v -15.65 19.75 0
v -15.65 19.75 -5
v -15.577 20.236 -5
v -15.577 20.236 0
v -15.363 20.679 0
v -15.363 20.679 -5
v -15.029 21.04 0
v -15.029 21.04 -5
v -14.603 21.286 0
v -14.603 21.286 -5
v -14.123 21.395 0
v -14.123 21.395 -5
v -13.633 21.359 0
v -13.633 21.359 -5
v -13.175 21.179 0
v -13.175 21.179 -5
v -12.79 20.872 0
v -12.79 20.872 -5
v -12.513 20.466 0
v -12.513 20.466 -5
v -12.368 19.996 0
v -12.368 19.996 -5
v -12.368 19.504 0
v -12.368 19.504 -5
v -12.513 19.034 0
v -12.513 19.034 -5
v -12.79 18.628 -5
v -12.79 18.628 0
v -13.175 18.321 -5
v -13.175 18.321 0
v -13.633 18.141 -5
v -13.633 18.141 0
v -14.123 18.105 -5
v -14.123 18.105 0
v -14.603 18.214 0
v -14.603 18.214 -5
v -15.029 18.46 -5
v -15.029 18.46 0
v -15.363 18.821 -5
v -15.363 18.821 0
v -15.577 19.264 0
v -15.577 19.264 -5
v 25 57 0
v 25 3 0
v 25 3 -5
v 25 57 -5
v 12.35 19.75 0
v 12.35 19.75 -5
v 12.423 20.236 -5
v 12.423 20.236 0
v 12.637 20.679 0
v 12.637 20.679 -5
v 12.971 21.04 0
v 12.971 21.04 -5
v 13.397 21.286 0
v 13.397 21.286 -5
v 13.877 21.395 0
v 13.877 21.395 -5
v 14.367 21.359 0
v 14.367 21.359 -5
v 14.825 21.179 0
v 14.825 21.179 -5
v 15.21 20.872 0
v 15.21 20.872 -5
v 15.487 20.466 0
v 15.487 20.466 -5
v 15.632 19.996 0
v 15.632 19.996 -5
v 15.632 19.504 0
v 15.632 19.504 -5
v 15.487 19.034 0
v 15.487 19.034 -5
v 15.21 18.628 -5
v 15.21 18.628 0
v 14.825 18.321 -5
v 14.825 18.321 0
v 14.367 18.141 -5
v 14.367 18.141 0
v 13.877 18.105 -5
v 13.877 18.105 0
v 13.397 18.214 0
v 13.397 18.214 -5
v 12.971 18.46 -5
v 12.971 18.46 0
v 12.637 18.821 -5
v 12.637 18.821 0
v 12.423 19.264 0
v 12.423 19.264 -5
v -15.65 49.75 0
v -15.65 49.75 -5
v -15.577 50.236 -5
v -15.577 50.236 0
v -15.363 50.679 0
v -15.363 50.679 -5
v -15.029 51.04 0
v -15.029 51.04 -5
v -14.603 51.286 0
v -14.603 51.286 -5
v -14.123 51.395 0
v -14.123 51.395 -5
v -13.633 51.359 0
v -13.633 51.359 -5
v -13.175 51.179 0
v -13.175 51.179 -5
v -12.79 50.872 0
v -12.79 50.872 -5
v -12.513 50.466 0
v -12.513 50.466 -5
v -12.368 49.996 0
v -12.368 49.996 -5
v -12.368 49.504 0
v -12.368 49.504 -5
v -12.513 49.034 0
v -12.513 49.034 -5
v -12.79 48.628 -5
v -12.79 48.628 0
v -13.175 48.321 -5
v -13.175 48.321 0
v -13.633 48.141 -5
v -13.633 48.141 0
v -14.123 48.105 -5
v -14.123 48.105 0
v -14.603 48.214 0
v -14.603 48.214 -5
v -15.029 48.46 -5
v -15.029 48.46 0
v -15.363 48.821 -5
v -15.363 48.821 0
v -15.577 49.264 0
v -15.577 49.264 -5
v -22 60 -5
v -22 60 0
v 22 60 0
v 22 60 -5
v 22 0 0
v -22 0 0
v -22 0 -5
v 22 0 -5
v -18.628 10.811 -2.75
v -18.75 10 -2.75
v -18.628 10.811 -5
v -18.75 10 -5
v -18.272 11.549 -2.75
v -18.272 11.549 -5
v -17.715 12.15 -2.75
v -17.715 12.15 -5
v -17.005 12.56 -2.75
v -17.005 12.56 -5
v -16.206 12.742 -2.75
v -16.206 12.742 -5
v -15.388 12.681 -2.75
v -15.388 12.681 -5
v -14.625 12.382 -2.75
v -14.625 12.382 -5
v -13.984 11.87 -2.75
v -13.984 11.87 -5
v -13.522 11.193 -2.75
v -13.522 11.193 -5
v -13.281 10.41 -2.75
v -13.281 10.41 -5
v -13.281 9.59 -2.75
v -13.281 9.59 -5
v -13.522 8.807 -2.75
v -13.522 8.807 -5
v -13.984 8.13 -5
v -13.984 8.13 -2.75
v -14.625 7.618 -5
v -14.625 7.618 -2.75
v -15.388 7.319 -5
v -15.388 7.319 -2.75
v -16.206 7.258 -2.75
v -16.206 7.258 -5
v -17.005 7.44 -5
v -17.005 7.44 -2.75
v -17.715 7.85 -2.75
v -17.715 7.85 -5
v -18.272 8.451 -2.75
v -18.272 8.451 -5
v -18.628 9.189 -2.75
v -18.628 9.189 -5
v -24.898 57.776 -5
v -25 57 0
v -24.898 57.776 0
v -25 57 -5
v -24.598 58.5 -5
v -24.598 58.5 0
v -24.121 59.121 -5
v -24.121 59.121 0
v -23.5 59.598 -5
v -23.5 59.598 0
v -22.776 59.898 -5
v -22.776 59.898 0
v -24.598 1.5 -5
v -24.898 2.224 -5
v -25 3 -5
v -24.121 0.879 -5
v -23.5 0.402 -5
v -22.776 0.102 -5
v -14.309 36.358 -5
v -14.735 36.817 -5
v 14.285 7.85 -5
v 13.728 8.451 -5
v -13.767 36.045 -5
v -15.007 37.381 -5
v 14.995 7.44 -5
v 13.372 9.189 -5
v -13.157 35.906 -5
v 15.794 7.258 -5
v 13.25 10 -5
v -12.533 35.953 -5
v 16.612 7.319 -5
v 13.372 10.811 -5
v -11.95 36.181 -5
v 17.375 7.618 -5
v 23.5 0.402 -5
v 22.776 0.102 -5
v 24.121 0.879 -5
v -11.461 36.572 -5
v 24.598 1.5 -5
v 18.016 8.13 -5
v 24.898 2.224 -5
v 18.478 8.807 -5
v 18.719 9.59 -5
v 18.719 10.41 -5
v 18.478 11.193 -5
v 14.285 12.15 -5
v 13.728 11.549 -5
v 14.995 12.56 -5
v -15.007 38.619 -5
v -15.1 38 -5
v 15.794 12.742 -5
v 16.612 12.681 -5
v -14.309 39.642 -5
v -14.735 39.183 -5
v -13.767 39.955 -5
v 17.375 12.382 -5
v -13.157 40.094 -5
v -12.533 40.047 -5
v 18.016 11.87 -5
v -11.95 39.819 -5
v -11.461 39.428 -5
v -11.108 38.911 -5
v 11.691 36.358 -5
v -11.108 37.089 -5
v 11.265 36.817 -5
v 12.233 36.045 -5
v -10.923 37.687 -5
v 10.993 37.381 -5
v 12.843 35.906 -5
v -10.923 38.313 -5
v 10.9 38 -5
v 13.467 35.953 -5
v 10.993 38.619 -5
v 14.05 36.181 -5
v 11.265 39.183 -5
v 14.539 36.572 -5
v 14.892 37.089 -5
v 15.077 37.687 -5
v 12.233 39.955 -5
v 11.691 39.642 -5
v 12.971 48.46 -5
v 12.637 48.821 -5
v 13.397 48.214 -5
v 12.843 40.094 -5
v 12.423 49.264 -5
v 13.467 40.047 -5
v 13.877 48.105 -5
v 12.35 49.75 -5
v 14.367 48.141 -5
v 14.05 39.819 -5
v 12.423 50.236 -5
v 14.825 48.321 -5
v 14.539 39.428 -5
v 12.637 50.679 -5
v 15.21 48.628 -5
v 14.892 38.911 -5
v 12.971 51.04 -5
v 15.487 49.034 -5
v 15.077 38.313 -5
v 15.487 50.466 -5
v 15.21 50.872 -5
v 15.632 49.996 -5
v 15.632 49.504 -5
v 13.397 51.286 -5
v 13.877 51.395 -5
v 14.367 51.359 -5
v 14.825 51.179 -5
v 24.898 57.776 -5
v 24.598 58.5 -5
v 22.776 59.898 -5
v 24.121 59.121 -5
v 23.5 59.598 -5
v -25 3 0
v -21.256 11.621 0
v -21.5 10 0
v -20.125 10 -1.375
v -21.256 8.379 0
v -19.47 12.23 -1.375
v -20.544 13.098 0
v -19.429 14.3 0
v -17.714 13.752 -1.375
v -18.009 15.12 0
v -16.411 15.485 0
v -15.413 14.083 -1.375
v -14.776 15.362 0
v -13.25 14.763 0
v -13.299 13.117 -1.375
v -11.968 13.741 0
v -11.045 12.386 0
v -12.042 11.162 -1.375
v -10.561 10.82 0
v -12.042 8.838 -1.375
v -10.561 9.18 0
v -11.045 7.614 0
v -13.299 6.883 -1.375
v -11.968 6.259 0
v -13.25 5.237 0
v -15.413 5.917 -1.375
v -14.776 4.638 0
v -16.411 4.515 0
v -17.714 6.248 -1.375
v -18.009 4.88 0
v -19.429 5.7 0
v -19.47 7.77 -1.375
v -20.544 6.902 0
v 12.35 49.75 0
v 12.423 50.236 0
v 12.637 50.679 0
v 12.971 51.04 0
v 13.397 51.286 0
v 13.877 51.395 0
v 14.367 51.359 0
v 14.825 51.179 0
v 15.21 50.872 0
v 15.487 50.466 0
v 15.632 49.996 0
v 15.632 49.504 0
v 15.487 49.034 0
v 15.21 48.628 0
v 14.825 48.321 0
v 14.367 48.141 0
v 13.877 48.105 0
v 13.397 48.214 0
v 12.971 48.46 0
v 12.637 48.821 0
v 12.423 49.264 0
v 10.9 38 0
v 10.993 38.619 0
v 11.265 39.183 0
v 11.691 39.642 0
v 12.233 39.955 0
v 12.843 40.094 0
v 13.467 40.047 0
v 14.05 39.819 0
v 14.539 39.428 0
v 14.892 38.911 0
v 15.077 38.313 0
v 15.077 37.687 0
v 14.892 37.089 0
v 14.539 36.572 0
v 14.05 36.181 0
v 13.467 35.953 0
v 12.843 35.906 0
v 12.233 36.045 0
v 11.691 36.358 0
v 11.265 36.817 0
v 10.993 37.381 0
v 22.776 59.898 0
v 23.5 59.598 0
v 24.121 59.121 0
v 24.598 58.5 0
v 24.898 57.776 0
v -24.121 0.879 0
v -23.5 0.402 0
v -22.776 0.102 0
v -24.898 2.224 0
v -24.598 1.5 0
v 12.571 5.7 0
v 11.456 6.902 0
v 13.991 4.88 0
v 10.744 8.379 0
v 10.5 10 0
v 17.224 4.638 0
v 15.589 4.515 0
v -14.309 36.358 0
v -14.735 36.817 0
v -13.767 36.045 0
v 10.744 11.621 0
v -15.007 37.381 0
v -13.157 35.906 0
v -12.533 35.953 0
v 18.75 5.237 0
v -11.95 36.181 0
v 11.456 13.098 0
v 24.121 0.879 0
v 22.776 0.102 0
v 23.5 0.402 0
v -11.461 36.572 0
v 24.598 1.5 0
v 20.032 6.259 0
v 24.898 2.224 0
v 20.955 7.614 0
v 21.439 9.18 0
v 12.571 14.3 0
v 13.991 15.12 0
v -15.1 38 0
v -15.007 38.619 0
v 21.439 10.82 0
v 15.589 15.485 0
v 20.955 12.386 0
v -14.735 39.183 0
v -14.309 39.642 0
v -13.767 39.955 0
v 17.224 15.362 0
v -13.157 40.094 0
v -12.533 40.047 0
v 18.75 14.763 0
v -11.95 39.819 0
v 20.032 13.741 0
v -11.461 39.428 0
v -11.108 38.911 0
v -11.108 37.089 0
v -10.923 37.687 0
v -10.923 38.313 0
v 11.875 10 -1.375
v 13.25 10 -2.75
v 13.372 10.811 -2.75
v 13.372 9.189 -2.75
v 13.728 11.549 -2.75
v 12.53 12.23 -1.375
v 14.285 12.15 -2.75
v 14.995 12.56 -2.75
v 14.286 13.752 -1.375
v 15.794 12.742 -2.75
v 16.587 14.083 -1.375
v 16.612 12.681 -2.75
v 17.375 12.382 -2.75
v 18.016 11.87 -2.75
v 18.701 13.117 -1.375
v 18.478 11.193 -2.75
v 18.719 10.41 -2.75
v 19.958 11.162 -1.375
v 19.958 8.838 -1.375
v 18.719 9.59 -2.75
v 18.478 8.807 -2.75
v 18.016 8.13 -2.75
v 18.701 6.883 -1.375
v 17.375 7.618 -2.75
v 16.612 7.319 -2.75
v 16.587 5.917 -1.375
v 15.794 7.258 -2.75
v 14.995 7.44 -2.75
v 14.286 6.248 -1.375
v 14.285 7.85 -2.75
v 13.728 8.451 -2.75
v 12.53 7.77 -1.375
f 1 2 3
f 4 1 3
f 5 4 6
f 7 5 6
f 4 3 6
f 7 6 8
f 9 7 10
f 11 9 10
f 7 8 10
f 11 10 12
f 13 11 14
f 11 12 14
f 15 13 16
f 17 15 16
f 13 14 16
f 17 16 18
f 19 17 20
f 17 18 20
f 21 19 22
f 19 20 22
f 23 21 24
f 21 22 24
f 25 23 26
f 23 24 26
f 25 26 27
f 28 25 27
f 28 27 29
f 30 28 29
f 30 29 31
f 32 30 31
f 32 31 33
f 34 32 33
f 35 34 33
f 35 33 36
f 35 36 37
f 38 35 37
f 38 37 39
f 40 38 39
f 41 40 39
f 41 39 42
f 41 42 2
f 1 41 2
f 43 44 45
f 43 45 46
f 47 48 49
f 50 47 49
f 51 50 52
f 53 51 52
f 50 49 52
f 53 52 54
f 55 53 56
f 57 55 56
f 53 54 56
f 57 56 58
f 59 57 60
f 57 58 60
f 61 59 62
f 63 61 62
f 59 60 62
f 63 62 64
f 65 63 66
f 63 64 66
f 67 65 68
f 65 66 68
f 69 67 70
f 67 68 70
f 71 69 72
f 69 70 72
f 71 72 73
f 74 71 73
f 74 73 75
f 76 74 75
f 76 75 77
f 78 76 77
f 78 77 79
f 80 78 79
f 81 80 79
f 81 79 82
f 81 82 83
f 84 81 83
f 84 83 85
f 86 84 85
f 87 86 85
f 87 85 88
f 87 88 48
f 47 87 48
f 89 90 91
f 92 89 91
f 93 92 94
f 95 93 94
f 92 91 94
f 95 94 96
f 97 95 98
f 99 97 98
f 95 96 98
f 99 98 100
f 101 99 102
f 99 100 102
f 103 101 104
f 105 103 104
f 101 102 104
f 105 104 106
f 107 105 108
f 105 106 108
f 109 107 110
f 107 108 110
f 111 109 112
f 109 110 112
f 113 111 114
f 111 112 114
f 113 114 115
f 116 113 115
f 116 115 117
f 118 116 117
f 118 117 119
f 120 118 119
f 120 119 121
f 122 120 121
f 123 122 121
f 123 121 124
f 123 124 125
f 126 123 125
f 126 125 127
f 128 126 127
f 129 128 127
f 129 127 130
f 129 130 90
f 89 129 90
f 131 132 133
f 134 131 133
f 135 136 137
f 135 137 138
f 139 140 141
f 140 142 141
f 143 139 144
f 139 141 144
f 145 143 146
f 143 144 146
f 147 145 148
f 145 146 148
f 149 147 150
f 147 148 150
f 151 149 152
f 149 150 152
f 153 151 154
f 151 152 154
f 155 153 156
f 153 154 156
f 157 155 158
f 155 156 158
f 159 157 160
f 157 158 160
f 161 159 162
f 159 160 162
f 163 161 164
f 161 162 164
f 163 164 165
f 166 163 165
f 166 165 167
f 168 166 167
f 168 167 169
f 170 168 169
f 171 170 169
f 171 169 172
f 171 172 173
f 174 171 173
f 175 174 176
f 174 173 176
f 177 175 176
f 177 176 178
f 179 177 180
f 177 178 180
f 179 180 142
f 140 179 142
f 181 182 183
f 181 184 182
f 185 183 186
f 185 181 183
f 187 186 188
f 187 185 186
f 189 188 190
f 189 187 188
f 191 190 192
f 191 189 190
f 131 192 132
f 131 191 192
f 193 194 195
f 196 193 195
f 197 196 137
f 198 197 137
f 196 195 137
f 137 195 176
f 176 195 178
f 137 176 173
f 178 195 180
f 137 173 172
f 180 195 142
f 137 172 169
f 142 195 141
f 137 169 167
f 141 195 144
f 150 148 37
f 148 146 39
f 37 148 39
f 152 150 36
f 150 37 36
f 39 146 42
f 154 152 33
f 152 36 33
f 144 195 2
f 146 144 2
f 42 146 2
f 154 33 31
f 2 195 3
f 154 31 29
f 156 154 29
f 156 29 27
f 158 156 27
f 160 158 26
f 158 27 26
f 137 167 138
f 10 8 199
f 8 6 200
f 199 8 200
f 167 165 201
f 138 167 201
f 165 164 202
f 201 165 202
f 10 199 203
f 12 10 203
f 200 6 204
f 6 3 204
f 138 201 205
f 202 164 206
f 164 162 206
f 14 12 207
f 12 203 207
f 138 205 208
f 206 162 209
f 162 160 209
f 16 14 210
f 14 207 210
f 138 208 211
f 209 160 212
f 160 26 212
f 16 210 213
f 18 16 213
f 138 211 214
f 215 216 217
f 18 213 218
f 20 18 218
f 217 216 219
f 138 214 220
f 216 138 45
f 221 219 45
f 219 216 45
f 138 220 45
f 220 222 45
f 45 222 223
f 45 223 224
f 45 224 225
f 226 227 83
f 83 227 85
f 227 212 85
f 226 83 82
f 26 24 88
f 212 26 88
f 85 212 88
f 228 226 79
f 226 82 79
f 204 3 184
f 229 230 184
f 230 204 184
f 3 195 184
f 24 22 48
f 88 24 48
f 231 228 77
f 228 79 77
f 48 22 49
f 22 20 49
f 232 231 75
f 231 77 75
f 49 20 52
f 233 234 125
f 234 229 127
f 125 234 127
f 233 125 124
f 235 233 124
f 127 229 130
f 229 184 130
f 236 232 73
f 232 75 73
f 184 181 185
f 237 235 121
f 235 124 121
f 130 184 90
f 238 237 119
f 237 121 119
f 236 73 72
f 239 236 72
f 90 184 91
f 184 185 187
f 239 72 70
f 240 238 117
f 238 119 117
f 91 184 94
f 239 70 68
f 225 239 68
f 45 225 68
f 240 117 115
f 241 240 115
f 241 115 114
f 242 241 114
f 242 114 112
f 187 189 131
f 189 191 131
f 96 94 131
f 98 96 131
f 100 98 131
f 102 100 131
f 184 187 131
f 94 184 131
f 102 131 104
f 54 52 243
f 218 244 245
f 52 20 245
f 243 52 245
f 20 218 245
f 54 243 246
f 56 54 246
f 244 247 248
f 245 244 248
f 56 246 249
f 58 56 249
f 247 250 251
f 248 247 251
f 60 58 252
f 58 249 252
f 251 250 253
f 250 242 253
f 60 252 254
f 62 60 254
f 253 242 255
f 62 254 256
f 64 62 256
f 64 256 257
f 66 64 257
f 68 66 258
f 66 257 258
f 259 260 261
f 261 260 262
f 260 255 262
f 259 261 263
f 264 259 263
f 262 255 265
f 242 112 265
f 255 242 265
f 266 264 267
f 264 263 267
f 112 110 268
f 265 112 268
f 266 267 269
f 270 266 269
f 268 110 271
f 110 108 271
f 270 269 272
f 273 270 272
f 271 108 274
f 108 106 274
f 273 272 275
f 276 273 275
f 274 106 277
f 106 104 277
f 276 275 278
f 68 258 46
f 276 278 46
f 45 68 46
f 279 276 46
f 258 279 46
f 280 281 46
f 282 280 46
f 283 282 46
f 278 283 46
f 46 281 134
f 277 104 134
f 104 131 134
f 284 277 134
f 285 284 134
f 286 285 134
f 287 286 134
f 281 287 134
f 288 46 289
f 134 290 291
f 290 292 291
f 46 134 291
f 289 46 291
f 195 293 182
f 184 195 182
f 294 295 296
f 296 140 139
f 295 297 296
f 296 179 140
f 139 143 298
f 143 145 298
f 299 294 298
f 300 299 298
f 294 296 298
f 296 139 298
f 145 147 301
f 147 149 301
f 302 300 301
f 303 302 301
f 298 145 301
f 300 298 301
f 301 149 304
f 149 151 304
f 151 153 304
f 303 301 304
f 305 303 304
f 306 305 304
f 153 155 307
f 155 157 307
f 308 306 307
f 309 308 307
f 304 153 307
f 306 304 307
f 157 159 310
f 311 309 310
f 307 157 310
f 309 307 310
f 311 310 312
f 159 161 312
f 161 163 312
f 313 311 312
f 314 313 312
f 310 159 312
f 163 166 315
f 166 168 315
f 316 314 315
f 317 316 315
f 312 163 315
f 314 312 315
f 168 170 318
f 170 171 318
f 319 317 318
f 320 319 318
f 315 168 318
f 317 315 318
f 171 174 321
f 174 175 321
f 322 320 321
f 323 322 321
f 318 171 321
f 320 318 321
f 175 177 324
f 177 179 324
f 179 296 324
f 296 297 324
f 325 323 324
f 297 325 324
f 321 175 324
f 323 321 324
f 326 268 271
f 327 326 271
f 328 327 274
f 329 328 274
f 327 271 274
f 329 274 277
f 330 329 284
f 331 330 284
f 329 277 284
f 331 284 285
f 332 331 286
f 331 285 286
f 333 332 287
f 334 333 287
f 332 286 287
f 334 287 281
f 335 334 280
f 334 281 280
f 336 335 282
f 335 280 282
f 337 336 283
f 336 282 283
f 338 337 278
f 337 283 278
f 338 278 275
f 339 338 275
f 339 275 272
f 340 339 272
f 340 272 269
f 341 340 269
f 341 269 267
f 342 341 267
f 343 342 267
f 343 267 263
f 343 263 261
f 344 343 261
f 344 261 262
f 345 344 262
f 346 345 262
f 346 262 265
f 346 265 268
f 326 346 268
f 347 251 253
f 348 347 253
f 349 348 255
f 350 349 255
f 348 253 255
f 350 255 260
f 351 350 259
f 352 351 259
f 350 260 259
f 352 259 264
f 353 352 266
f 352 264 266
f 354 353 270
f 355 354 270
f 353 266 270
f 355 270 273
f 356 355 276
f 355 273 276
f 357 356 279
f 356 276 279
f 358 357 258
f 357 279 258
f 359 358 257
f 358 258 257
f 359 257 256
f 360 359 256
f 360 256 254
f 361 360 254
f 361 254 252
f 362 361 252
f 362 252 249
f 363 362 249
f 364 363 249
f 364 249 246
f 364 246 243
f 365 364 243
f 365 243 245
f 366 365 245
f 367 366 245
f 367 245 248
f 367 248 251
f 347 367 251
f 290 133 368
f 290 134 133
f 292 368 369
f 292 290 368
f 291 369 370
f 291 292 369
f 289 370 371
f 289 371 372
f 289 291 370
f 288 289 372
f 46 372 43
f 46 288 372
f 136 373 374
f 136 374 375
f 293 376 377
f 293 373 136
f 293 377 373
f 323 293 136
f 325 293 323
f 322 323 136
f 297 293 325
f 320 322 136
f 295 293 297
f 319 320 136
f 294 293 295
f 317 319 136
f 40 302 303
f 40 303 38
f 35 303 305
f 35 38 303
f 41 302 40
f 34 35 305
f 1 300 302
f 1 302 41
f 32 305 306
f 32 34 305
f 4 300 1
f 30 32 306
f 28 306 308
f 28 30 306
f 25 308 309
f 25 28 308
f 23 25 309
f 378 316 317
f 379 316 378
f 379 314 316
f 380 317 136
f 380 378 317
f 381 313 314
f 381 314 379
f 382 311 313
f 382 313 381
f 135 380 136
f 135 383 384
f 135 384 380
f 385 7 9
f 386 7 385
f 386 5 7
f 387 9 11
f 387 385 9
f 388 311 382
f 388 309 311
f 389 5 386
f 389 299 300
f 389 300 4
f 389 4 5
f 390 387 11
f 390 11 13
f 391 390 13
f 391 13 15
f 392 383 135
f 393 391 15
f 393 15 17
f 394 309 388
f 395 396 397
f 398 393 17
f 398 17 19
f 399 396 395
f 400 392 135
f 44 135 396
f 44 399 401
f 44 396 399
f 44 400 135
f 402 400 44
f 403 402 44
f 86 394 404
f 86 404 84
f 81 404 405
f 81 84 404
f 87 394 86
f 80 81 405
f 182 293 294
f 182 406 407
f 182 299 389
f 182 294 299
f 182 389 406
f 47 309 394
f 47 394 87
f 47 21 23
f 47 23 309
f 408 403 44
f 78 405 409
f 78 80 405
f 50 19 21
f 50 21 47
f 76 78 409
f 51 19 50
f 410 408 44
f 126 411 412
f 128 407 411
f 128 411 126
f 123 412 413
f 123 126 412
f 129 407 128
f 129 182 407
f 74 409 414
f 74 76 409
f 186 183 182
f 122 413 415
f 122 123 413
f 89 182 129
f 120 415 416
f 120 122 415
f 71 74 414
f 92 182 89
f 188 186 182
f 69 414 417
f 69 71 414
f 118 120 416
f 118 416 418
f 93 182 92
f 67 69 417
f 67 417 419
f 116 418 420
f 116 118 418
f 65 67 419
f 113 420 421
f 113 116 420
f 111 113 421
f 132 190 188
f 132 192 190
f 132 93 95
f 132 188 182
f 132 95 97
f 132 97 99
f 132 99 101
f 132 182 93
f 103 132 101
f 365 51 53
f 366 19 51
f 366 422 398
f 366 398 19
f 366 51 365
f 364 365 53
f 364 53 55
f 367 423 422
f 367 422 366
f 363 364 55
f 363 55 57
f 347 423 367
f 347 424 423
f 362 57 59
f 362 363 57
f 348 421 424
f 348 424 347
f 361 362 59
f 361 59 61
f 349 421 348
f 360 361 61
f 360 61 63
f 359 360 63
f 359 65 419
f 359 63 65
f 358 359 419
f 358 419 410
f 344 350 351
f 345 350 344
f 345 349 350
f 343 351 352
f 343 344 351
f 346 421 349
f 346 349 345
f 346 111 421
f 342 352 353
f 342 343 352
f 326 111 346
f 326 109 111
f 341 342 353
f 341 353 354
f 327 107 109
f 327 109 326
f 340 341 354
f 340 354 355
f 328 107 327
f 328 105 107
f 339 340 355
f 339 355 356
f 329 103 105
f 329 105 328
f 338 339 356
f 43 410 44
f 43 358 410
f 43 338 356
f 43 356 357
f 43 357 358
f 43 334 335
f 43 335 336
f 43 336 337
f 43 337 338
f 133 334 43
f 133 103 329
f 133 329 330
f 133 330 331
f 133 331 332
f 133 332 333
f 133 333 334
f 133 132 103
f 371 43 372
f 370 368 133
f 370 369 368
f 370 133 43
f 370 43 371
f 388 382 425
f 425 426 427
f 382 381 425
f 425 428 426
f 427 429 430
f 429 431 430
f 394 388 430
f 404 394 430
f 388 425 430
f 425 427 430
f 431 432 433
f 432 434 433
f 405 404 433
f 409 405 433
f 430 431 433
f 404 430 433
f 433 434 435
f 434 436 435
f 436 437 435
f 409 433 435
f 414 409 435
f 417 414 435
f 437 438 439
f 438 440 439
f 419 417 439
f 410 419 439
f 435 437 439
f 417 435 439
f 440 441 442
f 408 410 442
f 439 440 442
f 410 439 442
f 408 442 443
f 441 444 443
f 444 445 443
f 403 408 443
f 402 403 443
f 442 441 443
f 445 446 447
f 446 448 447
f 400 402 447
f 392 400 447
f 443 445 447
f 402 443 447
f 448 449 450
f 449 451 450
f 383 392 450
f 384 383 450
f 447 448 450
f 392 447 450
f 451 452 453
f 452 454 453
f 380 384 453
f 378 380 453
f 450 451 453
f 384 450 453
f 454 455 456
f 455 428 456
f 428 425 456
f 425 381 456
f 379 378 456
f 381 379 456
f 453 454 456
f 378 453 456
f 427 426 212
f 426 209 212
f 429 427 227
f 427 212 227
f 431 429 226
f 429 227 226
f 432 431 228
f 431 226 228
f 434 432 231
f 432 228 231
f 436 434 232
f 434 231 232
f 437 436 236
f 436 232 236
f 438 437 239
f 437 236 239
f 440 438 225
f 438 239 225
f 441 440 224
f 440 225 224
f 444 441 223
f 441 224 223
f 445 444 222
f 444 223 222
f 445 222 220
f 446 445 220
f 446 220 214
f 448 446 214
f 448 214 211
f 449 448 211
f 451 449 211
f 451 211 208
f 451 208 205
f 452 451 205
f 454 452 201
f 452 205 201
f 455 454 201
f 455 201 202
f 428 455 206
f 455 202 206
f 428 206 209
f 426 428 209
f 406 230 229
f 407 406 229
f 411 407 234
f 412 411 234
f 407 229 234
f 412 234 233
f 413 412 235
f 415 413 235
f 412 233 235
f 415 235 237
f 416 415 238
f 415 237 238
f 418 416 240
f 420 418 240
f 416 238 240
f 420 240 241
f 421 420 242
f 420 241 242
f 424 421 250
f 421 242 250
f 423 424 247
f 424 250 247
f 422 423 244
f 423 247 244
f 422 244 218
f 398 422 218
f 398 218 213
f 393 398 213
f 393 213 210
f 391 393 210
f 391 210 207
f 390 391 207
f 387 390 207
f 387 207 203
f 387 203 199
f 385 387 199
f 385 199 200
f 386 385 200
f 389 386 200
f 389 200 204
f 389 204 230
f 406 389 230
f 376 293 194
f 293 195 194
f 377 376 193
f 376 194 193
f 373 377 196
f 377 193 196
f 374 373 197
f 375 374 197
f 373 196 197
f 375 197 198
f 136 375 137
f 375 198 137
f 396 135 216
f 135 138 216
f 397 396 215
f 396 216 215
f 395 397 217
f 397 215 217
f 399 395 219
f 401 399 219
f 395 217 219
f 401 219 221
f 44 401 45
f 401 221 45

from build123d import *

# Parameters (mm, degrees)
SKIZZE1_W                                            = 50
SKIZZE1_H                                            = 60
AUFSATZ_LINEAR_AUSTRAGEN1_DEPTH                      = 5
FORMSENKUNG_F_R_M5_LINSENSENKSCHRAUBE_MI_D           = 5.5
FORMSENKUNG_F_R_M5_LINSENSENKSCHRAUBE_MI_DEPTH       = 20
FORMSENKUNG_F_R_M5_LINSENSENKSCHRAUBE_MI_CSINK_D     = 11
FORMSENKUNG_F_R_M5_LINSENSENKSCHRAUBE_MI_CSINK_ANGLE = 90
FORMSENKUNG_F_R_M5_LINSENSENKSCHRAUBE_MI_TIP         = 1.652366702
KERNLOCH_F_R_M4_GEWINDE1_D                           = 3.3
KERNLOCH_F_R_M5_GEWINDE1_D                           = 4.2
VERRUNDUNG1_R                                        = 3


with BuildPart() as part:
    # Skizze1 → Aufsatz-Linear austragen1 (new body)
    with BuildSketch(Plane.XY):
        with Locations((0, 30)):
            Rectangle(SKIZZE1_W, SKIZZE1_H)
    extrude(amount=-AUFSATZ_LINEAR_AUSTRAGEN1_DEPTH)

    # Formsenkung für M5 Linsensenkschraube mit Schlitz1
    with Locations(Plane.XY):
        with Locations((-16, 10), (16, 10)):
            CounterSinkHole(FORMSENKUNG_F_R_M5_LINSENSENKSCHRAUBE_MI_D / 2, FORMSENKUNG_F_R_M5_LINSENSENKSCHRAUBE_MI_CSINK_D / 2, depth=FORMSENKUNG_F_R_M5_LINSENSENKSCHRAUBE_MI_DEPTH, counter_sink_angle=FORMSENKUNG_F_R_M5_LINSENSENKSCHRAUBE_MI_CSINK_ANGLE)
            with Locations((0, 0, -(FORMSENKUNG_F_R_M5_LINSENSENKSCHRAUBE_MI_DEPTH + FORMSENKUNG_F_R_M5_LINSENSENKSCHRAUBE_MI_TIP / 2))):  # 118° drill point
                Cone(0, FORMSENKUNG_F_R_M5_LINSENSENKSCHRAUBE_MI_D / 2, FORMSENKUNG_F_R_M5_LINSENSENKSCHRAUBE_MI_TIP, mode=Mode.SUBTRACT)

    # Kernloch für M4 Gewinde1 (through all)
    with Locations(Plane.XY):
        with Locations((-14, 19.75), (14, 19.75), (-14, 49.75), (14, 49.75)):
            Hole(KERNLOCH_F_R_M4_GEWINDE1_D / 2)

    # Kernloch für M5 Gewinde1 (through all)
    with Locations(Plane.XY):
        with Locations((-13, 38), (13, 38)):
            Hole(KERNLOCH_F_R_M5_GEWINDE1_D / 2)

    # Verrundung1
    verrundung1_edges = [part.edges().sort_by_distance(p)[0] for p in [
        (25, 0, -2.5),
        (-25, 0, -2.5),
        (-25, 60, -2.5),
        (25, 60, -2.5),
    ]]
    fillet(verrundung1_edges, radius=VERRUNDUNG1_R)


solid = part.part
